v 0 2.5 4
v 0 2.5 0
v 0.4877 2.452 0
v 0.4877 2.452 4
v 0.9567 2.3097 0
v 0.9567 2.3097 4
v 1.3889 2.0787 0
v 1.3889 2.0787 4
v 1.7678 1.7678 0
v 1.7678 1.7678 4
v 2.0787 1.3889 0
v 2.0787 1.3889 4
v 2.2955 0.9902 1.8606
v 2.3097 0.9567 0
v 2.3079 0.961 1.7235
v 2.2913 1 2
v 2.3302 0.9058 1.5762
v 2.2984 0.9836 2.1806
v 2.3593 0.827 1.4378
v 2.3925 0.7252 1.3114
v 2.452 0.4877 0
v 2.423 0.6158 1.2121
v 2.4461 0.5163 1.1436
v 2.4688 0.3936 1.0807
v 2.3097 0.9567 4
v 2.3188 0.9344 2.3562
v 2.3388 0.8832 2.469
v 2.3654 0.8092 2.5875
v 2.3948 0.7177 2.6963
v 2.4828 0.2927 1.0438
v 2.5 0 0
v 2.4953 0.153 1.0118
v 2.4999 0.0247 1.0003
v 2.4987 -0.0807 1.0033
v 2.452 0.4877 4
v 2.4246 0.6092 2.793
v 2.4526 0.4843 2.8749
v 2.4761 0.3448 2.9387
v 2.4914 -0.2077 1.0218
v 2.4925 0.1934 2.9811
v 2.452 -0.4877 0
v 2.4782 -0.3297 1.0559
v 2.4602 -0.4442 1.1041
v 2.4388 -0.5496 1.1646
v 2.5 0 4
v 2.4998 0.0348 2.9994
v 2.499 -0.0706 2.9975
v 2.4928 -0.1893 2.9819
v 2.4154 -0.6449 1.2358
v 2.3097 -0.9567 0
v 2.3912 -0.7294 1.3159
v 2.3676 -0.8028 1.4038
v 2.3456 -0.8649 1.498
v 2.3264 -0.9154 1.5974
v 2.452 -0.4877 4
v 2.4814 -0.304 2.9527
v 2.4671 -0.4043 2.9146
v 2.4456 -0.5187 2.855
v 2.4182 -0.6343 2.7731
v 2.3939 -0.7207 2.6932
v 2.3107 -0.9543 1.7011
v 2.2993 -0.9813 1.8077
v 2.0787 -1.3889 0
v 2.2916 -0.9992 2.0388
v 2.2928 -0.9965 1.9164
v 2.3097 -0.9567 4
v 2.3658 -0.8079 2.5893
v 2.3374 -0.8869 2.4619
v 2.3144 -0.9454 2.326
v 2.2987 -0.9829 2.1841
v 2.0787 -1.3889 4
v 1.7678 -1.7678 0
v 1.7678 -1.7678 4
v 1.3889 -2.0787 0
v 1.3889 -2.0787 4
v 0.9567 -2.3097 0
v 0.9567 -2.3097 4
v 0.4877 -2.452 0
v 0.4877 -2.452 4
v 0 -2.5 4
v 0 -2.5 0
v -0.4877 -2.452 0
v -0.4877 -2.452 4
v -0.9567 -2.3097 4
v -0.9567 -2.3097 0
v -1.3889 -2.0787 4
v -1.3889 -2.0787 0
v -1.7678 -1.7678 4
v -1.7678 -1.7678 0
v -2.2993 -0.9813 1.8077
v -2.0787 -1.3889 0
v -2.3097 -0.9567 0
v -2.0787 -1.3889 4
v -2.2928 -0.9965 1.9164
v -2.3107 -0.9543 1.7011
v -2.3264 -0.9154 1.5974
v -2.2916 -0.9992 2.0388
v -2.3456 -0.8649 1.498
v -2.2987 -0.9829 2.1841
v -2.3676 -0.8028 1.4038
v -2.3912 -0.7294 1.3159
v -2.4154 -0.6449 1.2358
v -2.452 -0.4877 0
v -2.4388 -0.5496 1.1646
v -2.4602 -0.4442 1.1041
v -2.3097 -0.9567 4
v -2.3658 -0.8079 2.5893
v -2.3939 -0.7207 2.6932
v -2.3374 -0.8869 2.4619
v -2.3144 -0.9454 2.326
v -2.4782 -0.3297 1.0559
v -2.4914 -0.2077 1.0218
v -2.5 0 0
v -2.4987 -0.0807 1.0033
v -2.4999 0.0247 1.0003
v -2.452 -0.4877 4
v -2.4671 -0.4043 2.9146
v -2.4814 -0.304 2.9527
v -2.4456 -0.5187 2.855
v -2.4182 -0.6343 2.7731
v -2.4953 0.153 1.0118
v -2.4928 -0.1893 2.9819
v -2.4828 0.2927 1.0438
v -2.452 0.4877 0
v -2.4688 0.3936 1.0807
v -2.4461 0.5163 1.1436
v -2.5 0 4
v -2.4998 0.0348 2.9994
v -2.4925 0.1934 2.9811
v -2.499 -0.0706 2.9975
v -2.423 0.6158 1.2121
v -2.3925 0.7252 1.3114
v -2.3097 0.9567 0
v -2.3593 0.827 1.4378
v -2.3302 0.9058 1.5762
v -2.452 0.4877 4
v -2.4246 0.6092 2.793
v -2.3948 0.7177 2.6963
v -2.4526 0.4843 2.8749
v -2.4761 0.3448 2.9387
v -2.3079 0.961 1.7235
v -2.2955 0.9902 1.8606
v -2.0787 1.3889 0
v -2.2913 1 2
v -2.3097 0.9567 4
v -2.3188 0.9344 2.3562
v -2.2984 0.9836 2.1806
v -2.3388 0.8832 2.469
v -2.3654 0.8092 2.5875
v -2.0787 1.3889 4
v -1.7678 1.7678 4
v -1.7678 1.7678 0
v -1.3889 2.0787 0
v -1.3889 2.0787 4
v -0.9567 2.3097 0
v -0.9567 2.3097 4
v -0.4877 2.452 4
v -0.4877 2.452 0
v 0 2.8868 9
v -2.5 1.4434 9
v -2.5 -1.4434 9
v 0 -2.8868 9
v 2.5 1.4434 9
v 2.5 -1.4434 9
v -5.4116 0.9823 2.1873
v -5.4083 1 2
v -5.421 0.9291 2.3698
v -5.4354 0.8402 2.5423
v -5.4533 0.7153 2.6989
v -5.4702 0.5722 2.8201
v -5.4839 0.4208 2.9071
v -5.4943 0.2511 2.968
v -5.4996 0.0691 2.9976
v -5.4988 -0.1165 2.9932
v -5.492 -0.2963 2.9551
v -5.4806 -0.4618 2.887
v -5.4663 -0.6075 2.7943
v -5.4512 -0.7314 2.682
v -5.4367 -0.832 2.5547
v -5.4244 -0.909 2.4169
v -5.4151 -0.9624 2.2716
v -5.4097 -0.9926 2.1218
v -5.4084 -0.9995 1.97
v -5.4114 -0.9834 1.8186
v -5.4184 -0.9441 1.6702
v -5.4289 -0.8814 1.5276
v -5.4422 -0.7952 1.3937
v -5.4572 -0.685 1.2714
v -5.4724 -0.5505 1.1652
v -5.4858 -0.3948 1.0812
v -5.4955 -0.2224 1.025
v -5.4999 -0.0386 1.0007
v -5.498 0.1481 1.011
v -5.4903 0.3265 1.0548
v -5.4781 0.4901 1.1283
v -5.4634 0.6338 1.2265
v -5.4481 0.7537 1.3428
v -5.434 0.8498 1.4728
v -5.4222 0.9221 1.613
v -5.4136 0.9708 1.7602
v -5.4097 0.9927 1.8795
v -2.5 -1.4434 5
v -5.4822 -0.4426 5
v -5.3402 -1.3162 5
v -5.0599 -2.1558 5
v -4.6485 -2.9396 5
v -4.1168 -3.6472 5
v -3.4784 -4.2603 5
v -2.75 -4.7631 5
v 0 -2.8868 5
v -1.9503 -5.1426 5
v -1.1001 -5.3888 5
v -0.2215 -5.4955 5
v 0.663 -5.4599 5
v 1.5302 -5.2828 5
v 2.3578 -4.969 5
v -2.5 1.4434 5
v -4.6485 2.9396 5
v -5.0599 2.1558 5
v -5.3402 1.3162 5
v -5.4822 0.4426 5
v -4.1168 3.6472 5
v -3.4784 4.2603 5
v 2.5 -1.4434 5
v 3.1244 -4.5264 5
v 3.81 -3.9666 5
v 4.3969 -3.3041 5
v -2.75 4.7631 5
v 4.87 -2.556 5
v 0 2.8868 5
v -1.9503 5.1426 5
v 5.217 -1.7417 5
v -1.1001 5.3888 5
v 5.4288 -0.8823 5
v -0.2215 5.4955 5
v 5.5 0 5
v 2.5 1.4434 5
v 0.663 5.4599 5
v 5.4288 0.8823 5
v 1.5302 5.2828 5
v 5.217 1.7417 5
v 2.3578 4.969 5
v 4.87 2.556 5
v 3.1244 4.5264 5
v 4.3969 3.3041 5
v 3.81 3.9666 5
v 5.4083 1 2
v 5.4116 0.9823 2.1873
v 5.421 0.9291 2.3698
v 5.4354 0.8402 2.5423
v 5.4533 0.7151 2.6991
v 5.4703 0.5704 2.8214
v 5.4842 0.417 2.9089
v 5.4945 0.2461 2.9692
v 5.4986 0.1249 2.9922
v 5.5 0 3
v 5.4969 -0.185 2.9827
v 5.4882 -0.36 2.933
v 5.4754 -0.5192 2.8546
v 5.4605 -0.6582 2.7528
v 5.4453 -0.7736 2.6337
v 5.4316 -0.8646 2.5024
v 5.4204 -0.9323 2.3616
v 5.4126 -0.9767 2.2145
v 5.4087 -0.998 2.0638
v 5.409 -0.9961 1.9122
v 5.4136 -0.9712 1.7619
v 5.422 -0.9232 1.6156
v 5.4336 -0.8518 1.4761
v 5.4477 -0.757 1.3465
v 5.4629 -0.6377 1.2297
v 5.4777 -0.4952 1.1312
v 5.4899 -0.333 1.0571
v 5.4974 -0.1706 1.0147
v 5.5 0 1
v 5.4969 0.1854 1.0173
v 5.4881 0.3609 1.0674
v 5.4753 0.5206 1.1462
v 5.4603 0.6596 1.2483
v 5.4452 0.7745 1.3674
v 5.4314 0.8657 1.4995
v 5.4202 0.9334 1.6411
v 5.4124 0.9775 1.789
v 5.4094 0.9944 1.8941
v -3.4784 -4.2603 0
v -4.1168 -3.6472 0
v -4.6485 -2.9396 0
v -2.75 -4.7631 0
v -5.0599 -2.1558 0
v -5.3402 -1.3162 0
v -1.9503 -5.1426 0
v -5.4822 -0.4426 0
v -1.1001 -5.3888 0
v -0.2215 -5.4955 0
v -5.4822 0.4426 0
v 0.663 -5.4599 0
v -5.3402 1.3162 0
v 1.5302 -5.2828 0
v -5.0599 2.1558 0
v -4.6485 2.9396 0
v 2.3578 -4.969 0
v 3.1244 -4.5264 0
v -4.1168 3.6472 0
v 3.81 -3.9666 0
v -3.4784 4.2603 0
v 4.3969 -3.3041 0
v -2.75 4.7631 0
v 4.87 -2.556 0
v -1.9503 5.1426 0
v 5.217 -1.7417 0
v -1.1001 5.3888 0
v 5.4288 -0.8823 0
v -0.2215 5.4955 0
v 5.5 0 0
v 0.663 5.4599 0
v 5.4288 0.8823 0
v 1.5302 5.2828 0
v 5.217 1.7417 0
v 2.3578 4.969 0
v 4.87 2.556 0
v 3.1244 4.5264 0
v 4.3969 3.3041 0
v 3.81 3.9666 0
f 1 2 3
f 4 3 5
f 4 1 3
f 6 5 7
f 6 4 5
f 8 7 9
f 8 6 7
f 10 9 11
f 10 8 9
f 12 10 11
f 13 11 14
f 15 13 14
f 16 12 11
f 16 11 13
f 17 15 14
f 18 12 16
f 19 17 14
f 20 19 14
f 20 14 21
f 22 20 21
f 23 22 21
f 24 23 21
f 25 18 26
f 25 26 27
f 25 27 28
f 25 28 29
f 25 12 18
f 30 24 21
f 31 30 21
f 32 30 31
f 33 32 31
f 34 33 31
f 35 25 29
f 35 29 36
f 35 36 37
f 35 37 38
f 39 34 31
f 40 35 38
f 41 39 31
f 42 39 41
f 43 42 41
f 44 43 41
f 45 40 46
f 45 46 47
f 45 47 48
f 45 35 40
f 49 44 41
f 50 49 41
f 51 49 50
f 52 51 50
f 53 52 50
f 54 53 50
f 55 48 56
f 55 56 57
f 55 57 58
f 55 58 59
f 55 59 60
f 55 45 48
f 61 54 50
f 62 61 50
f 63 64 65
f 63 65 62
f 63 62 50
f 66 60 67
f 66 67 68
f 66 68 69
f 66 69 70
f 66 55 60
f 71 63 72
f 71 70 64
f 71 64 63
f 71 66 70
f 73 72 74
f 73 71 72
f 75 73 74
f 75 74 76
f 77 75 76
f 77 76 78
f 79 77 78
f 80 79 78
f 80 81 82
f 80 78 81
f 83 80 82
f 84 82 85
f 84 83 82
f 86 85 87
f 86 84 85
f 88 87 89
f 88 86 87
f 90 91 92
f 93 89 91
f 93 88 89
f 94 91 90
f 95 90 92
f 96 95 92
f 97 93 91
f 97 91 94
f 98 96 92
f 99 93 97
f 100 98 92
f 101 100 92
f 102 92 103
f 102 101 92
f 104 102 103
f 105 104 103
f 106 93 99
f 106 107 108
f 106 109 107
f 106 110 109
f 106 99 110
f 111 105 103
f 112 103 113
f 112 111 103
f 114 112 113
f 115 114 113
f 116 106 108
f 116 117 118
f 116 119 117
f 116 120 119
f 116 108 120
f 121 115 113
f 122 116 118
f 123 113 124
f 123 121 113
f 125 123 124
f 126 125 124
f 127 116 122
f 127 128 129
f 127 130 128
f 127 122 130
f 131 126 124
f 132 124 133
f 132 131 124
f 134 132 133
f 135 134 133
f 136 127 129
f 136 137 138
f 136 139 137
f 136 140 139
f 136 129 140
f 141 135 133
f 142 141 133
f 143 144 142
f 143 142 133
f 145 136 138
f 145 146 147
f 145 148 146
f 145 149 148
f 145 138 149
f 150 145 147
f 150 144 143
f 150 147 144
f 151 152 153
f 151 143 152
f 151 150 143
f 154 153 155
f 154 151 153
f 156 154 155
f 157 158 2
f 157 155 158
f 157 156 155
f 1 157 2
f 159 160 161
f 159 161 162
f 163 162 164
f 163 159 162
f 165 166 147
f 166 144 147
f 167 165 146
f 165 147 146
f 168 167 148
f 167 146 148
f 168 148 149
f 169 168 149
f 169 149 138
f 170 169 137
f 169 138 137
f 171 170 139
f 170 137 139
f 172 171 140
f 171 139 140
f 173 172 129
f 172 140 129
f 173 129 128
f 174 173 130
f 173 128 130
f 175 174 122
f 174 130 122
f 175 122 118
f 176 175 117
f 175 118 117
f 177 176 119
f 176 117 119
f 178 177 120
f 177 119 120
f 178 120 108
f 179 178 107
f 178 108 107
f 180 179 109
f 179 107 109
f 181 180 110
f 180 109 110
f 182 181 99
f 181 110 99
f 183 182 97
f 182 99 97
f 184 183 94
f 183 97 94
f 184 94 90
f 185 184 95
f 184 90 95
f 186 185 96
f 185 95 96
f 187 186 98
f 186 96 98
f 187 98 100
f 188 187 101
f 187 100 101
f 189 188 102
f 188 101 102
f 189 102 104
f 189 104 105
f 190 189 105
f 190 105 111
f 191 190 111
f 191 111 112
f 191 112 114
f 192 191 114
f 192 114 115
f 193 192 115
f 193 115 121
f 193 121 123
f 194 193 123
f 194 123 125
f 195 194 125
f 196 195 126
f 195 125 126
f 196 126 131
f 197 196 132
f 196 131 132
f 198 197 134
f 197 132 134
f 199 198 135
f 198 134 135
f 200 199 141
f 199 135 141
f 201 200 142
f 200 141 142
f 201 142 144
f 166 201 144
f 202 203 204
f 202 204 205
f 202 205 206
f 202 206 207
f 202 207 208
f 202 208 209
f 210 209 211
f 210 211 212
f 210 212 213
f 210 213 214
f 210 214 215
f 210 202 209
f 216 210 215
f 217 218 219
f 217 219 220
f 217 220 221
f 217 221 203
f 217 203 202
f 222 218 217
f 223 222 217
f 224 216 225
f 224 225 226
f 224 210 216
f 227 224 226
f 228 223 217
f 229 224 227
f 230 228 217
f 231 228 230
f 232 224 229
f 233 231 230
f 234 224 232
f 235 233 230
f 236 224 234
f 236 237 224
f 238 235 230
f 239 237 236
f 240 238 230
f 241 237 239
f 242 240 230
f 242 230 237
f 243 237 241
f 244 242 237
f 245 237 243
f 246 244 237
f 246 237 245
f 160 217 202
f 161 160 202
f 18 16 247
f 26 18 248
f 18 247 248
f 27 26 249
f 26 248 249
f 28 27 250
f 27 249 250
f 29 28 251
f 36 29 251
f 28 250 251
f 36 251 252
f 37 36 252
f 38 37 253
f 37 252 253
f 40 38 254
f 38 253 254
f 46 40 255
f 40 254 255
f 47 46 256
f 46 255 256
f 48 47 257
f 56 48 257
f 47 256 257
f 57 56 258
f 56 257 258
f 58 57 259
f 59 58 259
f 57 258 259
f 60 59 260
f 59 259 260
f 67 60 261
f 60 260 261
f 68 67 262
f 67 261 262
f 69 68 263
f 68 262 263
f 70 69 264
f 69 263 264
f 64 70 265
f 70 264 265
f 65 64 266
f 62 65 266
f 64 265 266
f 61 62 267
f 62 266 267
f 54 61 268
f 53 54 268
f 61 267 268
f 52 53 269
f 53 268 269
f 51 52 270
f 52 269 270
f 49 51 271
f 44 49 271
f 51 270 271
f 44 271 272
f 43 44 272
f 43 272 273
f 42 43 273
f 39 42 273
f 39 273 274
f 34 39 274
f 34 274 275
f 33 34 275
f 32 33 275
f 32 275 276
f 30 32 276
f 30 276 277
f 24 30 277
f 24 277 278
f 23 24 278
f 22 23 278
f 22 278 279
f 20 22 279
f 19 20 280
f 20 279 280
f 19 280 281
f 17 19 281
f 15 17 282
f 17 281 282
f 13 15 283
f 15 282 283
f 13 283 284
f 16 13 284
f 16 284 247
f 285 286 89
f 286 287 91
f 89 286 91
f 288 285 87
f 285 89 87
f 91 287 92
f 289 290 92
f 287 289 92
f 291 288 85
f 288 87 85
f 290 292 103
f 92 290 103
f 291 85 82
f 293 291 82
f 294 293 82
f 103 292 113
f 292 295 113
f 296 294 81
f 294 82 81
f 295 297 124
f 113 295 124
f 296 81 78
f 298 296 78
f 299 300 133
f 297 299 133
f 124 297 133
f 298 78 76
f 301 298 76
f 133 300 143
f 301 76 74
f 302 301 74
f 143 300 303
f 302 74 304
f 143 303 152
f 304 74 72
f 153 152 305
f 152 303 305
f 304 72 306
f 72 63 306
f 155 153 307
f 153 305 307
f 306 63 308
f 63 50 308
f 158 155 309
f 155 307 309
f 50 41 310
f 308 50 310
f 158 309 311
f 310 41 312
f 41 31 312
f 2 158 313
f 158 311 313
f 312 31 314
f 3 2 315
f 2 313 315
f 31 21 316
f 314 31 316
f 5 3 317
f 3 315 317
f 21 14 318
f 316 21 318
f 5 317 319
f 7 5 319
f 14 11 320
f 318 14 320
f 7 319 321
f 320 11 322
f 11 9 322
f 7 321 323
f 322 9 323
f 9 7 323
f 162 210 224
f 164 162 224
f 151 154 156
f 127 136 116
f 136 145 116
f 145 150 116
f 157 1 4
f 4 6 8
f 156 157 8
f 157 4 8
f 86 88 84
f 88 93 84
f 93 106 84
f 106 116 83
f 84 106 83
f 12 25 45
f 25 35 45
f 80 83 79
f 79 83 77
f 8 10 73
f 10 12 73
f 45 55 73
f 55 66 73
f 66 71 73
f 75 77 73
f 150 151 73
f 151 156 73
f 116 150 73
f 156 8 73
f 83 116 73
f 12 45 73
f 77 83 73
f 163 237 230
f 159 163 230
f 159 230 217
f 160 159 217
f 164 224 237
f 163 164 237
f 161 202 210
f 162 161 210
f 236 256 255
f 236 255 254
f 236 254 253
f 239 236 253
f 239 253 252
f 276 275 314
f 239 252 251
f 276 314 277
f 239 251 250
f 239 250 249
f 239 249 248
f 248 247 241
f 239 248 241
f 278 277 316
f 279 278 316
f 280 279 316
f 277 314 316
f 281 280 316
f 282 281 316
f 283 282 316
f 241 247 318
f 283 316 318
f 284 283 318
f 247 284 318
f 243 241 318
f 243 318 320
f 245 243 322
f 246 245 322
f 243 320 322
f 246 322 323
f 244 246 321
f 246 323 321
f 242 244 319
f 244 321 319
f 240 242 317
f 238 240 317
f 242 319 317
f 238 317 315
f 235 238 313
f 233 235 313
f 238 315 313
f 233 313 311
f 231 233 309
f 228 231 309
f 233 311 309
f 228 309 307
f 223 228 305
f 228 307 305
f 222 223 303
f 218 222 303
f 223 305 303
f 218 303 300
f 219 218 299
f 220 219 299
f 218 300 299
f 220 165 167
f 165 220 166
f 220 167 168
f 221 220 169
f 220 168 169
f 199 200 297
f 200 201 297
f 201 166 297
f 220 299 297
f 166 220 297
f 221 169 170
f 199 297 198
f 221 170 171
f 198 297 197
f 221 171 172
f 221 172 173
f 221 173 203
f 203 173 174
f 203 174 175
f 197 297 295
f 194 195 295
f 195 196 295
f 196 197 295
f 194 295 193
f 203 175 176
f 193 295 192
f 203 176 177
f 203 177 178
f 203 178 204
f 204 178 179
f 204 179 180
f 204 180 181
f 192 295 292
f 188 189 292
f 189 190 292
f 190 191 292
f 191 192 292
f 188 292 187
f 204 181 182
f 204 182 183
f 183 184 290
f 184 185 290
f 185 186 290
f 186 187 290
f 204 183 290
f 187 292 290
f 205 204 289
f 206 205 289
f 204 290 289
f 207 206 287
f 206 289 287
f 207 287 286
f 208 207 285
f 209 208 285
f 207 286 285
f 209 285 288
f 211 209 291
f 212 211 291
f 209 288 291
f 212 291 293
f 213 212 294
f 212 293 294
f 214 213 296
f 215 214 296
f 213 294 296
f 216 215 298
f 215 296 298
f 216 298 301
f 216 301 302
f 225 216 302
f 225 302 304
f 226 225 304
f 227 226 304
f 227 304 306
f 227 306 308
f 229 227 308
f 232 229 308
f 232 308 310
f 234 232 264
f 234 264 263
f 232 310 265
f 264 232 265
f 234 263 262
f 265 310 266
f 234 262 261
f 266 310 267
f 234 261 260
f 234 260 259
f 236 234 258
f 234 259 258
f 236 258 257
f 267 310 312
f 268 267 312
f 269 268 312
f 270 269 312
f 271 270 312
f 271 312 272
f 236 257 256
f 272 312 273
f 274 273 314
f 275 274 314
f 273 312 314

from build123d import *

# Parameters (mm, degrees)
F1_DEPTH = 9
F0_R     = 5.5
F2_DEPTH = 5
F3_W     = 2.5
F3_H     = 8
F5_R     = 1
F6_DEPTH = 12.5


with BuildPart() as f1:
    # F0 (on Top) → F1 (new body)
    with BuildSketch(Plane.XY):
        Polygon((0, 2.8867513459), (-2.5, 1.443375673), (-2.5, -1.443375673), (0, -2.8867513459), (2.5, -1.443375673), (2.5, 1.443375673), align=None)
    extrude(amount=F1_DEPTH)

    # F0 (on Top) → F2 (join)
    with BuildSketch(Plane.XY):
        Circle(F0_R)
        Polygon((-2.5, -1.443375673), (-2.5, 1.443375673), (0, 2.8867513459), (2.5, 1.443375673), (2.5, -1.443375673), (0, -2.8867513459), align=None, mode=Mode.SUBTRACT)
    extrude(amount=F2_DEPTH)

    # F3 (on Right) → F4 (revolve, cut)
    with BuildSketch(Plane.YZ):
        with Locations((1.25, 0)):
            Rectangle(F3_W, F3_H)
    revolve(axis=Axis((0, 0, -0.2936716191), (0, 0, -1)), mode=Mode.SUBTRACT)

    # F5 (on Right) → F6 (cut, symmetric)
    with BuildSketch(Plane.YZ):
        with Locations((0, 2)):
            Circle(F5_R)
    extrude(amount=F6_DEPTH, both=True, mode=Mode.SUBTRACT)


solid = f1.part
